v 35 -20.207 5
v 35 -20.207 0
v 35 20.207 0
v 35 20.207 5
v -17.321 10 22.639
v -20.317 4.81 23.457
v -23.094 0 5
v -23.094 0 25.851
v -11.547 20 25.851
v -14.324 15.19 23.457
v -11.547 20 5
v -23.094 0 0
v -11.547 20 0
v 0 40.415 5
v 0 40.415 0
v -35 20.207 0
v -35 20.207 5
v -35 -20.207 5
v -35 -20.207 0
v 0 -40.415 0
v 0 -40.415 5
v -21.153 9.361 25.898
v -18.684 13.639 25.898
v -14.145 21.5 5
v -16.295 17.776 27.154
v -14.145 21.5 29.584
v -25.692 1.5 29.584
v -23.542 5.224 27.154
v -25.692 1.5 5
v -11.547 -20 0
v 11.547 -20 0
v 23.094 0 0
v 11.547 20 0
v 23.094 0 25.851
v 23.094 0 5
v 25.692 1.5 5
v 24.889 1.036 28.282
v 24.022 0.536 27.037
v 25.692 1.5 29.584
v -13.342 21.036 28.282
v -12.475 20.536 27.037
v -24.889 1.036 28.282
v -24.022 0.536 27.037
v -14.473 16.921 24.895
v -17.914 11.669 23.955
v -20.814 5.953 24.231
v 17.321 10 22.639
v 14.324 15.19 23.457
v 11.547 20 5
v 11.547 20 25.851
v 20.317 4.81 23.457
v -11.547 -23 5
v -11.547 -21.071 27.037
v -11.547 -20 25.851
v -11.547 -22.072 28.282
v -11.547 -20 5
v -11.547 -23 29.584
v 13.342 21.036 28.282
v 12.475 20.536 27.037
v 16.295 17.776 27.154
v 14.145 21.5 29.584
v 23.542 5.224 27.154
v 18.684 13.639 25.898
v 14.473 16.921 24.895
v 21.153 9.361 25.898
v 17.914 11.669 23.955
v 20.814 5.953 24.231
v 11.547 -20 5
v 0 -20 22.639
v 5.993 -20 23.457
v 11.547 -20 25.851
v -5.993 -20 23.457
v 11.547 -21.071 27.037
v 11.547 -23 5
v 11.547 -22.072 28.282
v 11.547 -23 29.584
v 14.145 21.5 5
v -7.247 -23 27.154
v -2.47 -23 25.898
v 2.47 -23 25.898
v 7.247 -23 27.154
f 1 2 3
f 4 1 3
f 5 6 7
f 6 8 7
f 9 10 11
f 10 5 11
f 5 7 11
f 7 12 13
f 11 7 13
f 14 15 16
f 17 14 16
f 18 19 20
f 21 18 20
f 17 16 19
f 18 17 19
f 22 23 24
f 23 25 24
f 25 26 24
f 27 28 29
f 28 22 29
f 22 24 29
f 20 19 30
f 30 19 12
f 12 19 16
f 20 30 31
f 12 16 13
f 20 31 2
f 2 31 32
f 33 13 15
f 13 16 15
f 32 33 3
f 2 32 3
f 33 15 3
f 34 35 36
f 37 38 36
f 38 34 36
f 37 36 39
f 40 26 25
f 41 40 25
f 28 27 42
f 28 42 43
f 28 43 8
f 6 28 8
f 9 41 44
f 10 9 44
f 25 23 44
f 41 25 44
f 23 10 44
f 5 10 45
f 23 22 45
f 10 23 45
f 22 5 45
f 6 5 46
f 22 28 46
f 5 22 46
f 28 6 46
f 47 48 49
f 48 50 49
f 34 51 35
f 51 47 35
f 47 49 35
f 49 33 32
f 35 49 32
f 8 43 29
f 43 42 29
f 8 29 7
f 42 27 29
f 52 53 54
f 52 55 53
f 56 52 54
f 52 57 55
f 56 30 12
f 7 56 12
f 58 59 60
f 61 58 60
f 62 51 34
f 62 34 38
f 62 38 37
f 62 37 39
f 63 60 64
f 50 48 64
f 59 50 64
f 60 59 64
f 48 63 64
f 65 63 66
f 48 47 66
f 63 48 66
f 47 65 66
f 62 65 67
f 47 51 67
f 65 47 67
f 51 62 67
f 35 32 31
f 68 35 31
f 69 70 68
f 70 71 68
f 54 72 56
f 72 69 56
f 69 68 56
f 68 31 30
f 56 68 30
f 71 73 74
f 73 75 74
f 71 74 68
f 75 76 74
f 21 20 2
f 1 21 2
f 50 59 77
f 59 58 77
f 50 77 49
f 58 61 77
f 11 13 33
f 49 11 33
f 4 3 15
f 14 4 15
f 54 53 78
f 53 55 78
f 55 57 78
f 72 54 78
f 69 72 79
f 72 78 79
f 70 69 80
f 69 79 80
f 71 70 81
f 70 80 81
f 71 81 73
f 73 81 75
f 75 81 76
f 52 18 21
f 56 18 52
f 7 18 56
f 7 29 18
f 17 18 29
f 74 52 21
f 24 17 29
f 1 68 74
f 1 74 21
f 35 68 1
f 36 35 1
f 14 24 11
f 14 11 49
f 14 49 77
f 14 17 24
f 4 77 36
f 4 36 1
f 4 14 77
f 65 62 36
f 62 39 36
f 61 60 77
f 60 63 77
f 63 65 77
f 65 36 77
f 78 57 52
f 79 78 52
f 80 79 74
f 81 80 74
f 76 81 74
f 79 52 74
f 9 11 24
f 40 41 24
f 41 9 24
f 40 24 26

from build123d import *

# Parameters (mm, degrees)
F1_DEPTH = 5
F2_W     = 23.09401
F2_H     = 3
F3_DEPTH = 40


with BuildPart() as f1:
    # F0 (on Top) → F1 (new body)
    with BuildSketch(Plane.XY):
        Polygon((35, -20.207259), (35, 20.207259), (0, 40.414519), (-35, 20.207259), (-35, -20.207259), (0, -40.414519), align=None)
        Polygon((-23.094011, 0), (-11.547005, 20), (11.547005, 20), (23.094011, 0), (11.547005, -20), (-11.547005, -20), align=None, mode=Mode.SUBTRACT)
    extrude(amount=F1_DEPTH)

    # F2 (on face) → F3 (join)
    with BuildSketch(Plane.XY.offset(5)):
        Polygon((-23.094011, 0), (-11.547005, 20), (-14.145082, 21.5), (-25.692087, 1.5), align=None)
        Polygon((14.145082, 21.5), (11.547005, 20), (23.094011, 0), (25.692087, 1.5), align=None)
        with Locations((0, -21.5)):
            Rectangle(F2_W, F2_H)
    extrude(amount=F3_DEPTH)

    # F4 (on face) → F5 (revolve, cut)
    with BuildSketch(Plane.XY.offset(45)):
        with BuildLine():
            Line((0, -30), (0, 30))
            ThreePointArc((0, 30), (-30, 0), (0, -30))
        make_face()
    revolve(axis=Axis((0, 0, 45), (0, -1, 0)), mode=Mode.SUBTRACT)


solid = f1.part
